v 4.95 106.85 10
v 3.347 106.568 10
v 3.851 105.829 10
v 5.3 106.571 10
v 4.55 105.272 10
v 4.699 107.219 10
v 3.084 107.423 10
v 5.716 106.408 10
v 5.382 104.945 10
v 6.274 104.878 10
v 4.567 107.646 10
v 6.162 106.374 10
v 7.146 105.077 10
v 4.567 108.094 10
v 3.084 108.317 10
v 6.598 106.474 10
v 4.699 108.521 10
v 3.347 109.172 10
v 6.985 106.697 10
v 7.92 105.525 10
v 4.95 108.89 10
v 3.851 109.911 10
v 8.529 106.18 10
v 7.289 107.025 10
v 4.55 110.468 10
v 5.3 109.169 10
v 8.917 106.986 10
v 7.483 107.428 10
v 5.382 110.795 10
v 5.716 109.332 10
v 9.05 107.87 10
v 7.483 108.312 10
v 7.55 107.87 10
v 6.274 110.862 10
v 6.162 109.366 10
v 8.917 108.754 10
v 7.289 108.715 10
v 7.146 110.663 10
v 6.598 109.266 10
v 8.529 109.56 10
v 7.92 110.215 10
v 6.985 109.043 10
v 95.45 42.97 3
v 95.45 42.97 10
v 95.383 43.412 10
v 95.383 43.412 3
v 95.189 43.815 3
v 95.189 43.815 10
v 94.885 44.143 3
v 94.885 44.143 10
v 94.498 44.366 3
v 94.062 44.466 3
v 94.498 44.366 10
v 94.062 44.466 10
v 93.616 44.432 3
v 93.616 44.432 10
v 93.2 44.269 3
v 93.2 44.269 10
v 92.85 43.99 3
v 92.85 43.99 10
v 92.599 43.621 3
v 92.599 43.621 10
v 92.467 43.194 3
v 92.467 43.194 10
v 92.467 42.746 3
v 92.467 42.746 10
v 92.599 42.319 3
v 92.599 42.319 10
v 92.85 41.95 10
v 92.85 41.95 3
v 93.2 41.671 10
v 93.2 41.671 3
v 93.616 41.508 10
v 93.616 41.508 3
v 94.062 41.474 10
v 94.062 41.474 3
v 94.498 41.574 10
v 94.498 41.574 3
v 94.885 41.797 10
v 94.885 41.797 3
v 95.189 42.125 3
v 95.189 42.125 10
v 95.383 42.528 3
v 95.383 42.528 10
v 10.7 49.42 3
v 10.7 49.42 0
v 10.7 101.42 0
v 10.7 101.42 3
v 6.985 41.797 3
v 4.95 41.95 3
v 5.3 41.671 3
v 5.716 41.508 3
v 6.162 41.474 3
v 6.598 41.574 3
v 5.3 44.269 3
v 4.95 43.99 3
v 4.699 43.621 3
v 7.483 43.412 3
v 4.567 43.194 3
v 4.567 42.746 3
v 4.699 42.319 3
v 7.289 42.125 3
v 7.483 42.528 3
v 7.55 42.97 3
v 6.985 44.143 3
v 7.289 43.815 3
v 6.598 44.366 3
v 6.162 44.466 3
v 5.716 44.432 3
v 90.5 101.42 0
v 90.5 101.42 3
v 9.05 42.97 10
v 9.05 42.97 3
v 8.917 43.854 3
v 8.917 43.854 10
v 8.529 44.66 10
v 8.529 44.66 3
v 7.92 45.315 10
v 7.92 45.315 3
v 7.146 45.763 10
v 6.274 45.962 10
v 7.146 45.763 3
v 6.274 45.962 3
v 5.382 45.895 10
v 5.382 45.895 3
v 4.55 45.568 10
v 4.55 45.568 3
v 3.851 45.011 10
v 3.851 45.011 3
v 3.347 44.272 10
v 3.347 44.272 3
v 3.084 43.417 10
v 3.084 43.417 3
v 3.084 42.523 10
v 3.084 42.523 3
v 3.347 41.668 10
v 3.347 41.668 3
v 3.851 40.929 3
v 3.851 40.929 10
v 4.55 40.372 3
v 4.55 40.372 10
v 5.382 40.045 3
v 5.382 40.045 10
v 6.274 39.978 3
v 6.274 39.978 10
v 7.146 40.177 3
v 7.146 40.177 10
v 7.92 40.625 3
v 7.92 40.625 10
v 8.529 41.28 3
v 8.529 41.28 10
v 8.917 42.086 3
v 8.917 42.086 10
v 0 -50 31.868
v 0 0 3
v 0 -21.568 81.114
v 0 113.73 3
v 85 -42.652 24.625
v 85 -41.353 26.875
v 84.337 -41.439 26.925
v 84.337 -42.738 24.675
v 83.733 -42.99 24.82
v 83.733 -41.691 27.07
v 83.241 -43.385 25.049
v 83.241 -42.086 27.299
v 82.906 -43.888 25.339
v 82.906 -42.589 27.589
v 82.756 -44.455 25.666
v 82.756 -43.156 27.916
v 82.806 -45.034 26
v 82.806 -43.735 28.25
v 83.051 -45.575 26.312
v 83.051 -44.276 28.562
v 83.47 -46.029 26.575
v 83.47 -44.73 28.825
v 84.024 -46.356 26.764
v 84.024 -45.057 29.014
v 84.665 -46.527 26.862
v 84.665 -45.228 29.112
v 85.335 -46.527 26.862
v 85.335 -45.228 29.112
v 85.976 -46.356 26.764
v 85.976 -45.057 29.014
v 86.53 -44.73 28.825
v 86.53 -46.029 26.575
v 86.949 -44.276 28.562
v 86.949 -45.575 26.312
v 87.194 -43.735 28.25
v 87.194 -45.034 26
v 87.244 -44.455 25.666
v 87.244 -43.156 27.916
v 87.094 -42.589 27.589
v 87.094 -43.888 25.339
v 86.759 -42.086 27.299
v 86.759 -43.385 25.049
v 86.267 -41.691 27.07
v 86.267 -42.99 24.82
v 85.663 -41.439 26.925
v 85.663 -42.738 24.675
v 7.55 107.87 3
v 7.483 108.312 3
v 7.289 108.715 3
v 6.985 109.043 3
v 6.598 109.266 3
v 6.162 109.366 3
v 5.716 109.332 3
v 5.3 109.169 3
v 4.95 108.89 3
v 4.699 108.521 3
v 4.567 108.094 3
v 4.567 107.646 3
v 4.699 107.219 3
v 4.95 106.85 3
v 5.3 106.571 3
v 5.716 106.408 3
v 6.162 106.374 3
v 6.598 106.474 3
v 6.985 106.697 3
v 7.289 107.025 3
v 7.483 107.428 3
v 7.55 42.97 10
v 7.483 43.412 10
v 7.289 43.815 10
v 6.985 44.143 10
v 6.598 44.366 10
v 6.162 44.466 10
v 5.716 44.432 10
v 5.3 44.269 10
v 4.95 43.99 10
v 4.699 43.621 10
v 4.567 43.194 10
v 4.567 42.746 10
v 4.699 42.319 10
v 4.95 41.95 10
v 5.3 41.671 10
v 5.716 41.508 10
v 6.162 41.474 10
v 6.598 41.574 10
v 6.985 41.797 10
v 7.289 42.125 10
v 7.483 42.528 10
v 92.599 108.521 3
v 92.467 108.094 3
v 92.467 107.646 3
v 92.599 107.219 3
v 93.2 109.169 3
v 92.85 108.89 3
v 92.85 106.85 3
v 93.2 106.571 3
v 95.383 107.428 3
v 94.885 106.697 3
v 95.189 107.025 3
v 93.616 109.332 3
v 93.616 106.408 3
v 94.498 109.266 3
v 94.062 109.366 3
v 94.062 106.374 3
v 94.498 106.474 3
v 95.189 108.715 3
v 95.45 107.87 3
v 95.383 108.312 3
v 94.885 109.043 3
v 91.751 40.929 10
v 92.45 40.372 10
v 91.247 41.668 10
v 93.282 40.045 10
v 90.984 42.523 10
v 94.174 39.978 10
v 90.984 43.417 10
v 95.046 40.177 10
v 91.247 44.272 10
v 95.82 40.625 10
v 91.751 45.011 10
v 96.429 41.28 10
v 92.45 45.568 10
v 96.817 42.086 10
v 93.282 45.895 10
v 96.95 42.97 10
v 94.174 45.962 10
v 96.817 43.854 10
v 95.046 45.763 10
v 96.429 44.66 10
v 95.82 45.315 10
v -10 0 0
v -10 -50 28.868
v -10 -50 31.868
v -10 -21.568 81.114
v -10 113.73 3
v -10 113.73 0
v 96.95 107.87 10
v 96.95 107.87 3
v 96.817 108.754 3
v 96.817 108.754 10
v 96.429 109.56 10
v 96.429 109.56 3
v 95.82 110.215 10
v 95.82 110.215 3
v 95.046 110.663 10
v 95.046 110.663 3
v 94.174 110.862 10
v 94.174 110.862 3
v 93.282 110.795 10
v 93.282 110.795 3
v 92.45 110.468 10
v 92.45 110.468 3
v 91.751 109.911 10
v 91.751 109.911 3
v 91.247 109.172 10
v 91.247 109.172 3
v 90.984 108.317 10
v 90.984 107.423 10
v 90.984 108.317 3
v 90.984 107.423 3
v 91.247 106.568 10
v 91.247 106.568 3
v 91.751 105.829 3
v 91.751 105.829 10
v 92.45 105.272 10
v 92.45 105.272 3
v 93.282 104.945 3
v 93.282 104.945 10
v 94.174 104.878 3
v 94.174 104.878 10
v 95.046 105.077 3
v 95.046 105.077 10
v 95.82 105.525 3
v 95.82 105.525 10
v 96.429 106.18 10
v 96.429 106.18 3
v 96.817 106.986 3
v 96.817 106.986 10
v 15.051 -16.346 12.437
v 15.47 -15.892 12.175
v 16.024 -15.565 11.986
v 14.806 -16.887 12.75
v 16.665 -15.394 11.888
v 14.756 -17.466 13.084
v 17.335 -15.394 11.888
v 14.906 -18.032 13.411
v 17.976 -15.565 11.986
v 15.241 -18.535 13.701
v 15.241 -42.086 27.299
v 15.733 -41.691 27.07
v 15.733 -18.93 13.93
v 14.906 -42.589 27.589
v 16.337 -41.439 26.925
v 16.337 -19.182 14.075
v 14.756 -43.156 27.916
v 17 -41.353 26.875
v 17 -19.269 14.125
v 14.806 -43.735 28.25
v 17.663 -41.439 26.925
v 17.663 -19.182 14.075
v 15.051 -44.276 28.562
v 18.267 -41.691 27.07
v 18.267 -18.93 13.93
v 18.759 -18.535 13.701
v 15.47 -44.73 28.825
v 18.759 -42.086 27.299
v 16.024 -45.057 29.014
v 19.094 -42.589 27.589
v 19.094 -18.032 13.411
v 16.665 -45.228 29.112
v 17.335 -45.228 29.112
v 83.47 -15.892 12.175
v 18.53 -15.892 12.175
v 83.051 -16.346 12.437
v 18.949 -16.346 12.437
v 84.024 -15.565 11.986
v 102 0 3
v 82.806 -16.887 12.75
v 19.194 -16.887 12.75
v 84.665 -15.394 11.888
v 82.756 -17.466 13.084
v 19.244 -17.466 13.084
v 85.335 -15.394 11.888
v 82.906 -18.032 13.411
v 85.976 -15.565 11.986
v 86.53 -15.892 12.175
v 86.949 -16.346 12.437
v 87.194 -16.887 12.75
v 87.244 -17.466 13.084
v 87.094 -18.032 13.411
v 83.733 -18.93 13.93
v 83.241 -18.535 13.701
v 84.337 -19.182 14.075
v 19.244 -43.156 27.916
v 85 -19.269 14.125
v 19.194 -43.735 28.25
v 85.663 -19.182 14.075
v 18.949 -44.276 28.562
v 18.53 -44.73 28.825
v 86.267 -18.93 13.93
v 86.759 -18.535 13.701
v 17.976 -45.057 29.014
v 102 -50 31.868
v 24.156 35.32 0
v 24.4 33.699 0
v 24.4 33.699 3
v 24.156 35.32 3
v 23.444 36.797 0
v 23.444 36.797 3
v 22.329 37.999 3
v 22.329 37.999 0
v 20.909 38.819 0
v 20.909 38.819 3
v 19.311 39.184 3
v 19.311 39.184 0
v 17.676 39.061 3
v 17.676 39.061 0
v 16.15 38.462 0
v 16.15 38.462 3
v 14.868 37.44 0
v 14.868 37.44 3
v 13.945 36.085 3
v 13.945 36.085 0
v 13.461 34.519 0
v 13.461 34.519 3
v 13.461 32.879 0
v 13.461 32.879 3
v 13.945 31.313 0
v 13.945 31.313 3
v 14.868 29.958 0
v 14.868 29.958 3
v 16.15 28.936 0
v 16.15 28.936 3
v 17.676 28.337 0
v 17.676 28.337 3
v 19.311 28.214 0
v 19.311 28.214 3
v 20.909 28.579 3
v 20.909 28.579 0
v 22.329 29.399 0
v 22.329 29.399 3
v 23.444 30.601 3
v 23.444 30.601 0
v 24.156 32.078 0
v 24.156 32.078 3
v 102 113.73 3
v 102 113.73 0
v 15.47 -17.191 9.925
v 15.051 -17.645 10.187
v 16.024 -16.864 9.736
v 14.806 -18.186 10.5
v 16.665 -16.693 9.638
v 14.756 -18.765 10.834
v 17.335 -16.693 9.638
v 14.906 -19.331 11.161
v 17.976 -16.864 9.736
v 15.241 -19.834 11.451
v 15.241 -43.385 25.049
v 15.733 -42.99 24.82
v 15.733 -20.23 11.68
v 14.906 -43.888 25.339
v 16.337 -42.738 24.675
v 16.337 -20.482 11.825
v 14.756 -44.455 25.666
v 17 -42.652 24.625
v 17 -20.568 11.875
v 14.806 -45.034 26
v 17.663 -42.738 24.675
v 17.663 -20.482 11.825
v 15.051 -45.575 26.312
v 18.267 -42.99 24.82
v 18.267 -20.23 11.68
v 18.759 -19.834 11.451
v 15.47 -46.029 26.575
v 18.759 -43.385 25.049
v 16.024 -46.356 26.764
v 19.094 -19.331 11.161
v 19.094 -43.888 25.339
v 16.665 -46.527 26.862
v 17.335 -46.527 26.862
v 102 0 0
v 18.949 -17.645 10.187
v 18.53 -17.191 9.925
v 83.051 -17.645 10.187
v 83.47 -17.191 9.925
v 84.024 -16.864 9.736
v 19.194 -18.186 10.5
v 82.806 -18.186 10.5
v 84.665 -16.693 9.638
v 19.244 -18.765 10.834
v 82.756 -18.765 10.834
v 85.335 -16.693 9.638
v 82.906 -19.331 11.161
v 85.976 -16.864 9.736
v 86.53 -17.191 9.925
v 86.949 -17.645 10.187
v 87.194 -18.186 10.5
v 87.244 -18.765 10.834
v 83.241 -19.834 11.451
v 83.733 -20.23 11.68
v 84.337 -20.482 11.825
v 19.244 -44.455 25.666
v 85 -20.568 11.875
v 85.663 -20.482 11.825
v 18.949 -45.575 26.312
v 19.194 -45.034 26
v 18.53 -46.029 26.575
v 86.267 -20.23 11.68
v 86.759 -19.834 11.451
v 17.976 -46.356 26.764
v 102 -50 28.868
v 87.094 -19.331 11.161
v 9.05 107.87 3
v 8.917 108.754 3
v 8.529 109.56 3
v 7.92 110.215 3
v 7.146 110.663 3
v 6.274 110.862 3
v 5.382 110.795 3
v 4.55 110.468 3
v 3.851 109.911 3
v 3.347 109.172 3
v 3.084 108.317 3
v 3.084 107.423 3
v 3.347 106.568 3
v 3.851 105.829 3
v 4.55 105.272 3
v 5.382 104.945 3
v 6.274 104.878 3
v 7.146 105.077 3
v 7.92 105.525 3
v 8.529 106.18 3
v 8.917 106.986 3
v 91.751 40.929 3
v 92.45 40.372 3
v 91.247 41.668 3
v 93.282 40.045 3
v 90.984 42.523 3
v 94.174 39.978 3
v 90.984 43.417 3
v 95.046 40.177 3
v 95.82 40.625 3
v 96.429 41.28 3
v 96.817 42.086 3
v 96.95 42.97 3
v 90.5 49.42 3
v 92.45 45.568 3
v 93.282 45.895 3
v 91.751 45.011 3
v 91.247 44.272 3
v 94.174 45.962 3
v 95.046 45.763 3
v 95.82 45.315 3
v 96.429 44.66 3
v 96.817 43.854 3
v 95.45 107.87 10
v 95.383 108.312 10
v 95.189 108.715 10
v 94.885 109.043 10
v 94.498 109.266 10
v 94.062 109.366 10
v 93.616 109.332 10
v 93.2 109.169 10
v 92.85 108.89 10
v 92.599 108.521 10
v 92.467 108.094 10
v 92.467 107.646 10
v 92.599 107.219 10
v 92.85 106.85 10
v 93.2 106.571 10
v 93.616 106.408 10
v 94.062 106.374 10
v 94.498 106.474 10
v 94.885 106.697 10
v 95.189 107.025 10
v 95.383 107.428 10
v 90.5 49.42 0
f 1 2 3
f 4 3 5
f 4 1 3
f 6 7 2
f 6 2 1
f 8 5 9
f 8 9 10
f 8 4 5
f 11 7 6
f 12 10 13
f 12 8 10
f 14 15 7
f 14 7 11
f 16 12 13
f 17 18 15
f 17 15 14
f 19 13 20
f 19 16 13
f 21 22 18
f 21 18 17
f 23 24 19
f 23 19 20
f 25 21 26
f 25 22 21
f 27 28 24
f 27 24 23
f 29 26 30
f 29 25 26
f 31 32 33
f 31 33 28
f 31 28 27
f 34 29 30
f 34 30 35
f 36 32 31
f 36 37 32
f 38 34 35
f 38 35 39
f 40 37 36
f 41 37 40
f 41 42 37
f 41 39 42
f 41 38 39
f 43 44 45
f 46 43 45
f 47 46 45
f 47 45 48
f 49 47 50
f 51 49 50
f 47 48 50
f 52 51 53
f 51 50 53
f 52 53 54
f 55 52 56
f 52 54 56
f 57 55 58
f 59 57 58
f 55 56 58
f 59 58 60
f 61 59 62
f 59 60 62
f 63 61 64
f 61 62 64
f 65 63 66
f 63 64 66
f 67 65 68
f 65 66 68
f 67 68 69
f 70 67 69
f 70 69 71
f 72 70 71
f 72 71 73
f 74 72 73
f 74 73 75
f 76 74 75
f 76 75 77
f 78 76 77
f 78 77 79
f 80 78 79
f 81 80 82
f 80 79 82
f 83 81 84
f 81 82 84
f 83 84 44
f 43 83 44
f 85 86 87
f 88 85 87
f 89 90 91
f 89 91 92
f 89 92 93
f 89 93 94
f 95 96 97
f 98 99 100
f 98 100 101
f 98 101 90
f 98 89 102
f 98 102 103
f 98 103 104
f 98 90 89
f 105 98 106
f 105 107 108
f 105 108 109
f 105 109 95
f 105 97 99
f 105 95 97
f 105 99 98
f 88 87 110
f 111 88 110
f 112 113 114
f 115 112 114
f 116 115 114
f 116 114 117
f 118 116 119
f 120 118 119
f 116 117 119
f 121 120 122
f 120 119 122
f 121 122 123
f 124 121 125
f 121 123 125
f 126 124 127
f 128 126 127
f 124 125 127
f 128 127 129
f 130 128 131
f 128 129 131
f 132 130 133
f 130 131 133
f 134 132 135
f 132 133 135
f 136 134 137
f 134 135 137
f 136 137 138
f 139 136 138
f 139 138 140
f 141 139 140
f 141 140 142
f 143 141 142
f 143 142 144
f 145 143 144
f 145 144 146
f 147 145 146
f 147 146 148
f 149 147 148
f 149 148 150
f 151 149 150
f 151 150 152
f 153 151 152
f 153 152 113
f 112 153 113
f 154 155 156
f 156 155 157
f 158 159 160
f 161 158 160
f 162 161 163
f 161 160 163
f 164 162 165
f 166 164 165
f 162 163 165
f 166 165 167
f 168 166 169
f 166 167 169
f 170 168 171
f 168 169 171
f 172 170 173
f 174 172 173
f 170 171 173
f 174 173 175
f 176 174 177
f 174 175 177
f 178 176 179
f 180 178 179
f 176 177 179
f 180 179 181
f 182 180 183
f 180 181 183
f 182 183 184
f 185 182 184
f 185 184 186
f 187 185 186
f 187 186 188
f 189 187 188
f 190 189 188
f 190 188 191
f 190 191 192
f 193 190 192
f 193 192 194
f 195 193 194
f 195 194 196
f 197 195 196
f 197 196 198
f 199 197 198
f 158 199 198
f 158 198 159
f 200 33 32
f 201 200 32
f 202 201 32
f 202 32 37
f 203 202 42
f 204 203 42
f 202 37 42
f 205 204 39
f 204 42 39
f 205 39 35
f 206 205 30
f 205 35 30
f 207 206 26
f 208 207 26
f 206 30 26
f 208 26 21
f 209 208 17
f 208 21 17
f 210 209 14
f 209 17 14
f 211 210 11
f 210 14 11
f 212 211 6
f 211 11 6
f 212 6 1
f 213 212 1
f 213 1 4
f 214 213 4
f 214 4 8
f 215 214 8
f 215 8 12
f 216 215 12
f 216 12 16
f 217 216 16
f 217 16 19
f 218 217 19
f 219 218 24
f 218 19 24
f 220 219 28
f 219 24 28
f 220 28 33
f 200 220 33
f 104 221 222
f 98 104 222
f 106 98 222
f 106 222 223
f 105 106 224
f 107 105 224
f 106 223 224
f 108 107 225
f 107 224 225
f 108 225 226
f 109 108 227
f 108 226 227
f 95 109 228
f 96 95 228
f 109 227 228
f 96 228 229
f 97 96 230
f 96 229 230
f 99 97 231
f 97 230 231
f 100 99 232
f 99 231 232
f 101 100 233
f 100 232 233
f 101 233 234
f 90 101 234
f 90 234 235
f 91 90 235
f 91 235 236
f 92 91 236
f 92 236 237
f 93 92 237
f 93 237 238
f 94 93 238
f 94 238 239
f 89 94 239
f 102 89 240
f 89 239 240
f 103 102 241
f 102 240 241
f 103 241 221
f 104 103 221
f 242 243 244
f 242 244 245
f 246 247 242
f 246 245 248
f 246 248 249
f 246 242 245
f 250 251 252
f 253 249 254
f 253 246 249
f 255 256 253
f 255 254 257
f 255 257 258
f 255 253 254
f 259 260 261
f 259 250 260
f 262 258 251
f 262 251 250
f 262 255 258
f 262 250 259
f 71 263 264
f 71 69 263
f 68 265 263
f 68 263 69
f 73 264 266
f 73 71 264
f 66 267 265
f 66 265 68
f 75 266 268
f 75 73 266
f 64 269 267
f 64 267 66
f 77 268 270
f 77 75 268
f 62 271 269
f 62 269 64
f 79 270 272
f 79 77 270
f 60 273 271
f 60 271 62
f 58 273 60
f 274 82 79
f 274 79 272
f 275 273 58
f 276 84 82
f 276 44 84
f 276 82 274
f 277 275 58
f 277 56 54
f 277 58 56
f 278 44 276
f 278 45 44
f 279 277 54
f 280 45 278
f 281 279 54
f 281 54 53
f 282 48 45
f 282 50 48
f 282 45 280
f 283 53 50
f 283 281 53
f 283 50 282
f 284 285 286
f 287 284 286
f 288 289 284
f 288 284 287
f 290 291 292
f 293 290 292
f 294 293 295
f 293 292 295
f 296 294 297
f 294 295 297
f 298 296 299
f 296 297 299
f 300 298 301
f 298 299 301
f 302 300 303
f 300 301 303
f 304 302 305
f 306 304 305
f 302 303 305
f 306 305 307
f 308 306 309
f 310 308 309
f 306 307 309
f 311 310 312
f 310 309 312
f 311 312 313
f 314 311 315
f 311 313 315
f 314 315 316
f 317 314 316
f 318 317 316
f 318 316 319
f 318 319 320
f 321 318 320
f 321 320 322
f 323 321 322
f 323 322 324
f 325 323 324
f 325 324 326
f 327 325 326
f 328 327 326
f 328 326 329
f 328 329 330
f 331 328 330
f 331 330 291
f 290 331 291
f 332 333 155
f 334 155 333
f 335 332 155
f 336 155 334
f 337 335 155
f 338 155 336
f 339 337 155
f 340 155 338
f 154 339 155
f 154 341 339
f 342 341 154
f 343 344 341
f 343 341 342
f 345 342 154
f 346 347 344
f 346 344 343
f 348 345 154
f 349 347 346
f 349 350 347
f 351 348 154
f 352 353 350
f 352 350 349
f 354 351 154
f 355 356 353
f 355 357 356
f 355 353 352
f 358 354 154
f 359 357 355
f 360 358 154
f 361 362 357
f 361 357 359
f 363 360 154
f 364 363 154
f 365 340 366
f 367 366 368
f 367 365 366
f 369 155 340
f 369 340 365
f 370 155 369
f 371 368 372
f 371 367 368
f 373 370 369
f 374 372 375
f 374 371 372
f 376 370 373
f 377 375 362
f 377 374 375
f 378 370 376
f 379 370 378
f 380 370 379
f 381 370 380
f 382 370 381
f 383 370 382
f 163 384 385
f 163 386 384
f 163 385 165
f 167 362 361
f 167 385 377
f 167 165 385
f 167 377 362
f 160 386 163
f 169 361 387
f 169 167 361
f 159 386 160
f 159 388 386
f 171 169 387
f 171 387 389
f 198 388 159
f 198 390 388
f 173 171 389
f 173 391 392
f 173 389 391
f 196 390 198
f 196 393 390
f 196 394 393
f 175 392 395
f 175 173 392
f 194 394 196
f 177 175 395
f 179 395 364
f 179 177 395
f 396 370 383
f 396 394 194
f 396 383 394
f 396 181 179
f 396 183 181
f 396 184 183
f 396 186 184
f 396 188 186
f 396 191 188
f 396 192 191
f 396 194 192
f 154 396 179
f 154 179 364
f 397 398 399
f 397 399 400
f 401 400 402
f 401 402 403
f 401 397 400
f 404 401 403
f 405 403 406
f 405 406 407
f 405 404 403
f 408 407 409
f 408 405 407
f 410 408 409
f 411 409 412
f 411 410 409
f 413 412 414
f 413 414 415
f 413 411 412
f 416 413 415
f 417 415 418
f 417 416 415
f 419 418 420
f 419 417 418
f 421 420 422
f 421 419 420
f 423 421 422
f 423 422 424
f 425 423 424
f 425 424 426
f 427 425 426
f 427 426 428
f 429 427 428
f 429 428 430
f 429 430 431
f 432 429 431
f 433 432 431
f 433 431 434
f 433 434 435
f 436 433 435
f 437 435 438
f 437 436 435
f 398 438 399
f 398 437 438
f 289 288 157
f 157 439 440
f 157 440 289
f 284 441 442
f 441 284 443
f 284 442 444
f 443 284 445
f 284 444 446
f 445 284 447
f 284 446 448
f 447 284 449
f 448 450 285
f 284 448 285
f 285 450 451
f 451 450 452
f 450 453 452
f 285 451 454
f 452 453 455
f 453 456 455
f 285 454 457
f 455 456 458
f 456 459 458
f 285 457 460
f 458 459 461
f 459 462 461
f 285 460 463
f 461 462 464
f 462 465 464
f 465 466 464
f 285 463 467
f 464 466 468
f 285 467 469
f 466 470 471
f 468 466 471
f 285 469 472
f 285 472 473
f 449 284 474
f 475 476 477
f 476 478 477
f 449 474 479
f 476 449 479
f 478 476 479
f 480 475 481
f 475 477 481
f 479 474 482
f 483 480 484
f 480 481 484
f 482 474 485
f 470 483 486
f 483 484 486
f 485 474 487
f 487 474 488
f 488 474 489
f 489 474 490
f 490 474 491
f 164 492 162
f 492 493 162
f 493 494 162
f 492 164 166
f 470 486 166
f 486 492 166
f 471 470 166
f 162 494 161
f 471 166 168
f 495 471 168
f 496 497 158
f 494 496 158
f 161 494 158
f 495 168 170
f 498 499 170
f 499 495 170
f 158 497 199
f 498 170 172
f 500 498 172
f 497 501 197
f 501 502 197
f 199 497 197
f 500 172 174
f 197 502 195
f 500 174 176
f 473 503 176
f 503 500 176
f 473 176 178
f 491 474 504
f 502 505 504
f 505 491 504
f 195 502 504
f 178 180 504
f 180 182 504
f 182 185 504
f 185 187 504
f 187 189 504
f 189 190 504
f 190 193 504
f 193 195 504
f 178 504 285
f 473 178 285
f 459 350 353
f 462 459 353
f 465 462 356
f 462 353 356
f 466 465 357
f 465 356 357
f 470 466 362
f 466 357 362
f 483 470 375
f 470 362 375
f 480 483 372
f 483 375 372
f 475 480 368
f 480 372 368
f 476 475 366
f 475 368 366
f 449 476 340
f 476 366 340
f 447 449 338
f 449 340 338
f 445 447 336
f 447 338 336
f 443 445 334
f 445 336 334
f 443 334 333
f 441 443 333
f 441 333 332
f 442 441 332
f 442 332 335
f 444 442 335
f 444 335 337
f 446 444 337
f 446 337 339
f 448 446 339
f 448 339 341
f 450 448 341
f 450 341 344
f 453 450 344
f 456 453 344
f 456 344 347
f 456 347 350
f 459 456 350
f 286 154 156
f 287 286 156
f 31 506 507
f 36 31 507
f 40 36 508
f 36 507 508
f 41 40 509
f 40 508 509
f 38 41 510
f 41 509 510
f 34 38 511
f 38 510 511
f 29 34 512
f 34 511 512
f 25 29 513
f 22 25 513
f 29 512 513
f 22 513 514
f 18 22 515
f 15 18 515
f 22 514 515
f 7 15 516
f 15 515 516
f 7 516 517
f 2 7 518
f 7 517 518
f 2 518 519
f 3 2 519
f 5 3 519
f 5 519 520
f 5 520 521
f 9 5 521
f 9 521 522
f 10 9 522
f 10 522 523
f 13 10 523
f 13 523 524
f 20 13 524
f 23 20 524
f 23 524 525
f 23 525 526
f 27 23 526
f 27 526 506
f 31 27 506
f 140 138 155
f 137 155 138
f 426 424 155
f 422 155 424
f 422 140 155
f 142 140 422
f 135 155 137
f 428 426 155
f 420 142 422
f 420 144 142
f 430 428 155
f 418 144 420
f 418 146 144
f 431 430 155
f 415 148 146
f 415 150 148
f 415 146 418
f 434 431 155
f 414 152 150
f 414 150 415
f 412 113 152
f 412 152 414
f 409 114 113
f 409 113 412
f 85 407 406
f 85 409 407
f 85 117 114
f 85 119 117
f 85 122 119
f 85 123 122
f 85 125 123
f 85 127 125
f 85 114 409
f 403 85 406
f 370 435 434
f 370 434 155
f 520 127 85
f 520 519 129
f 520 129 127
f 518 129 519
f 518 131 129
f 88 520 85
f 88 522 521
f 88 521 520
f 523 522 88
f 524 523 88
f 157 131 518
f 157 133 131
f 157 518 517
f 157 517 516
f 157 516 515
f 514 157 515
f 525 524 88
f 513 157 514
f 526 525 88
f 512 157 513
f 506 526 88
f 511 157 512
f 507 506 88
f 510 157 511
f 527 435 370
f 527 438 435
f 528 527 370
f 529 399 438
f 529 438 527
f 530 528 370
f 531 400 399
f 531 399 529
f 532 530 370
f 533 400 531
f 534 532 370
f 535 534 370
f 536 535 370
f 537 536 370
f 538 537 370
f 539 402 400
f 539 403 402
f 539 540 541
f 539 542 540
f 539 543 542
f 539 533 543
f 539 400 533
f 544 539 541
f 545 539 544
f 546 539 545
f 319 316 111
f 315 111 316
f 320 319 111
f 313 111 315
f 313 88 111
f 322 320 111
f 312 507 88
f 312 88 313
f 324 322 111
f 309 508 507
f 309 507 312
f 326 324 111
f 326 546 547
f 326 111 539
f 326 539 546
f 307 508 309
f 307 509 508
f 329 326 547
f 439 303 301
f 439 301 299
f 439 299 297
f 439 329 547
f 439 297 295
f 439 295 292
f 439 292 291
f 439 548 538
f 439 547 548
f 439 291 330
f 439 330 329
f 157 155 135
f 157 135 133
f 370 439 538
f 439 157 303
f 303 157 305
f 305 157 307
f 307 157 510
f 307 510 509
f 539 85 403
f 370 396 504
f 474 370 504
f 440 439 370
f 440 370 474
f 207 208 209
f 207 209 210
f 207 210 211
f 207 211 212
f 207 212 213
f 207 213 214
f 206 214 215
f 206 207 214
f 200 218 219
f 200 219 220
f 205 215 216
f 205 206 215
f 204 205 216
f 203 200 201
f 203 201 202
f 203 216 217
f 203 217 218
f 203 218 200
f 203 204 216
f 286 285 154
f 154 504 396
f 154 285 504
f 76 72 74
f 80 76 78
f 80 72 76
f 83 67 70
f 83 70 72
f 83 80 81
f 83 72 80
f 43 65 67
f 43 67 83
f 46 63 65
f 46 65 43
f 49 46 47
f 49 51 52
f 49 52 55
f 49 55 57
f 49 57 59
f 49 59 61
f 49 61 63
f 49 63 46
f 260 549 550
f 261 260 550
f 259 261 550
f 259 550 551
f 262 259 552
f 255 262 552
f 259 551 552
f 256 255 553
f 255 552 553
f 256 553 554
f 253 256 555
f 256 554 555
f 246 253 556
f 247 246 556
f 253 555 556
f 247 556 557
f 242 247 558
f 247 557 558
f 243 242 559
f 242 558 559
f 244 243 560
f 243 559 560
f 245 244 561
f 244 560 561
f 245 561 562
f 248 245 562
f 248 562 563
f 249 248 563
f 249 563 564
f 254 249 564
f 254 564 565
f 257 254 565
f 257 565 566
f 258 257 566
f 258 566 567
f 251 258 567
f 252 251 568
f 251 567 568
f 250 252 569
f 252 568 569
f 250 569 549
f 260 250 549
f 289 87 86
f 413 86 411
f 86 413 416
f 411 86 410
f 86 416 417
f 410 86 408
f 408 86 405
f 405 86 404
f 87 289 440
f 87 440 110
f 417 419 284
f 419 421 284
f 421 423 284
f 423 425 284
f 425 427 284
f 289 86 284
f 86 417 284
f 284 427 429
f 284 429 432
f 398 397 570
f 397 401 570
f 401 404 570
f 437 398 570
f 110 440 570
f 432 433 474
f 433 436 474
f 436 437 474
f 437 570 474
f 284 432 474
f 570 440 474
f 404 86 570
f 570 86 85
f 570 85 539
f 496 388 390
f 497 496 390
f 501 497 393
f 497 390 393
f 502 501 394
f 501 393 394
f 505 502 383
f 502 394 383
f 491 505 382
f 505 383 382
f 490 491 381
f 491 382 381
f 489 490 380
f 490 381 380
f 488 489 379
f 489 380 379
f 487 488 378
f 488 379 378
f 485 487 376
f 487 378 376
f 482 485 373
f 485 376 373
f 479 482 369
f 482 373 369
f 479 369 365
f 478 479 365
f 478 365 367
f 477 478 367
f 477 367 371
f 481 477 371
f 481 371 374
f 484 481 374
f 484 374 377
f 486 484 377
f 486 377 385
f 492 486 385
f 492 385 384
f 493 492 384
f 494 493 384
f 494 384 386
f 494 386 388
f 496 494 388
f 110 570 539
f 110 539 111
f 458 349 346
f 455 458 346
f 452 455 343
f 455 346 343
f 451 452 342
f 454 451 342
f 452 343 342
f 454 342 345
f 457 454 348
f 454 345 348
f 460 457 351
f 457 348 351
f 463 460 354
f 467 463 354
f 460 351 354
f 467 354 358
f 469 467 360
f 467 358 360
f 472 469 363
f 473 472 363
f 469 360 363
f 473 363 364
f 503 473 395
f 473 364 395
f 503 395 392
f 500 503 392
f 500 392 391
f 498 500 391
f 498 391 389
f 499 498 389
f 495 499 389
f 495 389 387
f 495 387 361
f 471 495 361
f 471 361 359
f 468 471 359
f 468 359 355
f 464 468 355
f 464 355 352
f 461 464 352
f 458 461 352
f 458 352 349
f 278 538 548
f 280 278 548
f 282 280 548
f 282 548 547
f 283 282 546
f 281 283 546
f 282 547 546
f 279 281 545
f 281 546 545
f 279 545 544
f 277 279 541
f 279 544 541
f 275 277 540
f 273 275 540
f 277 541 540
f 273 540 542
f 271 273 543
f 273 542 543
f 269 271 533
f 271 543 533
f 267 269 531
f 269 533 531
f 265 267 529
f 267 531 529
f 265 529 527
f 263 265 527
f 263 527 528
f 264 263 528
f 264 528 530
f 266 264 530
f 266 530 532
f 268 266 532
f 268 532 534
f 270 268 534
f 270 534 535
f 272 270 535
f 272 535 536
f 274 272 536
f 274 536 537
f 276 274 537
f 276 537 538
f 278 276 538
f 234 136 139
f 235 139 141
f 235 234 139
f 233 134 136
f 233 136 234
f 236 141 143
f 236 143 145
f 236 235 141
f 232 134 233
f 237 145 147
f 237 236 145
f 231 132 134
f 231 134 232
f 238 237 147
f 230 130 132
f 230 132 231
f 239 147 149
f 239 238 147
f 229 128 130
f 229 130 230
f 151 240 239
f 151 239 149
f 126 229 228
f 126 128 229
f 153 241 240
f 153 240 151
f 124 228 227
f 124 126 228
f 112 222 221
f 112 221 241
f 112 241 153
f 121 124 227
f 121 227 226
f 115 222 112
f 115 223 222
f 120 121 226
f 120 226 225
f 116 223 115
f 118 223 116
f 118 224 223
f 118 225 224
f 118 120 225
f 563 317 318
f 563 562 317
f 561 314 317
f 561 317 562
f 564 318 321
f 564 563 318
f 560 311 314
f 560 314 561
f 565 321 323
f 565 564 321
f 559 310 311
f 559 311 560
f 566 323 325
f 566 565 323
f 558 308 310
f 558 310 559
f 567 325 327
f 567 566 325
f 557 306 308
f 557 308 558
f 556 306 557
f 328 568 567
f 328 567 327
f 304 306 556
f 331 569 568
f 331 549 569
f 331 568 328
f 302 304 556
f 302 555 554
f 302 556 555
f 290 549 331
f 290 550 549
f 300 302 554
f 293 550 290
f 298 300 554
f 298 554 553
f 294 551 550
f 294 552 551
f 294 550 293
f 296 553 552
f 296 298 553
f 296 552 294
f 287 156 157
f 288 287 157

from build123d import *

# Parameters (mm, degrees)
SKETCH1_W           = 102
SKETCH1_H           = 113.73
SKETCH1_R           = 3
SKETCH1_R_2         = 5.5
SKETCH1_W_2         = 79.8
SKETCH1_H_2         = 52
BOSS_EXTRUDE1_DEPTH = 3
SKETCH1_3_R         = 3
BOSS_EXTRUDE2_DEPTH = 10
SKETCH2_R           = 1.5
CUT_EXTRUDE1_DEPTH  = 7
BOSS_EXTRUDE3_DEPTH = 102
SKETCH4_R           = 2.25
CUT_EXTRUDE2_DEPTH  = 155.667120928
BOSS_EXTRUDE4_DEPTH = 10


with BuildPart() as part:
    # Sketch1 → Boss-Extrude1 (new body)
    with BuildSketch(Plane.XY):
        with Locations((51, 56.865)):
            Rectangle(SKETCH1_W, SKETCH1_H)
        with Locations((6.05, 42.97)):
            Circle(SKETCH1_R, mode=Mode.SUBTRACT)
        with Locations((93.95, 42.97)):
            Circle(SKETCH1_R, mode=Mode.SUBTRACT)
        with Locations((18.9, 33.699)):
            Circle(SKETCH1_R_2, mode=Mode.SUBTRACT)
        with Locations((50.6, 75.42)):
            Rectangle(SKETCH1_W_2, SKETCH1_H_2, mode=Mode.SUBTRACT)
    extrude(amount=BOSS_EXTRUDE1_DEPTH)

    # Sketch1<3> → Boss-Extrude2 (add)
    with BuildSketch(Plane.XY):
        with Locations((6.05, 107.87)):
            Circle(SKETCH1_3_R)
        with Locations((93.95, 107.87)):
            Circle(SKETCH1_3_R)
        with Locations((6.05, 42.97)):
            Circle(SKETCH1_3_R)
        with Locations((93.95, 42.97)):
            Circle(SKETCH1_3_R)
    extrude(amount=BOSS_EXTRUDE2_DEPTH)

    # Sketch2 → Cut-Extrude1 (cut)
    with BuildSketch(Plane.XY.offset(10)):
        with Locations((6.05, 107.87)):
            Circle(SKETCH2_R)
        with Locations((93.95, 107.87)):
            Circle(SKETCH2_R)
        with Locations((93.95, 42.97)):
            Circle(SKETCH2_R)
        with Locations((6.05, 42.97)):
            Circle(SKETCH2_R)
    extrude(amount=-CUT_EXTRUDE1_DEPTH, mode=Mode.SUBTRACT)

    # Sketch3 → Boss-Extrude3 (add)
    with BuildSketch(Plane(origin=(102, 0, 0), x_dir=(0, 0, -1), z_dir=(1, 0, 0))):
        Polygon((-3, 0), (-31.867513459, -50), (-28.867513459, -50), (0, 0), align=None)
    extrude(amount=-BOSS_EXTRUDE3_DEPTH)

    # Sketch4 → Cut-Extrude2 (cut, through all)
    with BuildSketch(Plane(origin=(0, 1.299038106, 2.25), x_dir=(1, 0, 0), z_dir=(0, 0.4999999999999944, 0.8660254037844419))):
        with Locations(Location((17, -21.5, 0), (0, 0, 270))):
            Circle(SKETCH4_R)
        with Locations(Location((85, -21.5, 0), (0, 0, 270))):
            Circle(SKETCH4_R)
        with Locations(Location((85, -51.5, 0), (0, 0, 90))):
            Circle(SKETCH4_R)
        with Locations(Location((17, -51.5, 0), (0, 0, 90))):
            Circle(SKETCH4_R)
    extrude(amount=-CUT_EXTRUDE2_DEPTH, mode=Mode.SUBTRACT)

    # Sketch5 → Boss-Extrude4 (add)
    with BuildSketch(Plane.ZY):
        Polygon((31.867513459, -50), (81.114048046, -21.5675), (3, 113.73), (0, 113.73), (0, 0), (28.867513459, -50), align=None)
    extrude(amount=BOSS_EXTRUDE4_DEPTH)


solid = part.part
